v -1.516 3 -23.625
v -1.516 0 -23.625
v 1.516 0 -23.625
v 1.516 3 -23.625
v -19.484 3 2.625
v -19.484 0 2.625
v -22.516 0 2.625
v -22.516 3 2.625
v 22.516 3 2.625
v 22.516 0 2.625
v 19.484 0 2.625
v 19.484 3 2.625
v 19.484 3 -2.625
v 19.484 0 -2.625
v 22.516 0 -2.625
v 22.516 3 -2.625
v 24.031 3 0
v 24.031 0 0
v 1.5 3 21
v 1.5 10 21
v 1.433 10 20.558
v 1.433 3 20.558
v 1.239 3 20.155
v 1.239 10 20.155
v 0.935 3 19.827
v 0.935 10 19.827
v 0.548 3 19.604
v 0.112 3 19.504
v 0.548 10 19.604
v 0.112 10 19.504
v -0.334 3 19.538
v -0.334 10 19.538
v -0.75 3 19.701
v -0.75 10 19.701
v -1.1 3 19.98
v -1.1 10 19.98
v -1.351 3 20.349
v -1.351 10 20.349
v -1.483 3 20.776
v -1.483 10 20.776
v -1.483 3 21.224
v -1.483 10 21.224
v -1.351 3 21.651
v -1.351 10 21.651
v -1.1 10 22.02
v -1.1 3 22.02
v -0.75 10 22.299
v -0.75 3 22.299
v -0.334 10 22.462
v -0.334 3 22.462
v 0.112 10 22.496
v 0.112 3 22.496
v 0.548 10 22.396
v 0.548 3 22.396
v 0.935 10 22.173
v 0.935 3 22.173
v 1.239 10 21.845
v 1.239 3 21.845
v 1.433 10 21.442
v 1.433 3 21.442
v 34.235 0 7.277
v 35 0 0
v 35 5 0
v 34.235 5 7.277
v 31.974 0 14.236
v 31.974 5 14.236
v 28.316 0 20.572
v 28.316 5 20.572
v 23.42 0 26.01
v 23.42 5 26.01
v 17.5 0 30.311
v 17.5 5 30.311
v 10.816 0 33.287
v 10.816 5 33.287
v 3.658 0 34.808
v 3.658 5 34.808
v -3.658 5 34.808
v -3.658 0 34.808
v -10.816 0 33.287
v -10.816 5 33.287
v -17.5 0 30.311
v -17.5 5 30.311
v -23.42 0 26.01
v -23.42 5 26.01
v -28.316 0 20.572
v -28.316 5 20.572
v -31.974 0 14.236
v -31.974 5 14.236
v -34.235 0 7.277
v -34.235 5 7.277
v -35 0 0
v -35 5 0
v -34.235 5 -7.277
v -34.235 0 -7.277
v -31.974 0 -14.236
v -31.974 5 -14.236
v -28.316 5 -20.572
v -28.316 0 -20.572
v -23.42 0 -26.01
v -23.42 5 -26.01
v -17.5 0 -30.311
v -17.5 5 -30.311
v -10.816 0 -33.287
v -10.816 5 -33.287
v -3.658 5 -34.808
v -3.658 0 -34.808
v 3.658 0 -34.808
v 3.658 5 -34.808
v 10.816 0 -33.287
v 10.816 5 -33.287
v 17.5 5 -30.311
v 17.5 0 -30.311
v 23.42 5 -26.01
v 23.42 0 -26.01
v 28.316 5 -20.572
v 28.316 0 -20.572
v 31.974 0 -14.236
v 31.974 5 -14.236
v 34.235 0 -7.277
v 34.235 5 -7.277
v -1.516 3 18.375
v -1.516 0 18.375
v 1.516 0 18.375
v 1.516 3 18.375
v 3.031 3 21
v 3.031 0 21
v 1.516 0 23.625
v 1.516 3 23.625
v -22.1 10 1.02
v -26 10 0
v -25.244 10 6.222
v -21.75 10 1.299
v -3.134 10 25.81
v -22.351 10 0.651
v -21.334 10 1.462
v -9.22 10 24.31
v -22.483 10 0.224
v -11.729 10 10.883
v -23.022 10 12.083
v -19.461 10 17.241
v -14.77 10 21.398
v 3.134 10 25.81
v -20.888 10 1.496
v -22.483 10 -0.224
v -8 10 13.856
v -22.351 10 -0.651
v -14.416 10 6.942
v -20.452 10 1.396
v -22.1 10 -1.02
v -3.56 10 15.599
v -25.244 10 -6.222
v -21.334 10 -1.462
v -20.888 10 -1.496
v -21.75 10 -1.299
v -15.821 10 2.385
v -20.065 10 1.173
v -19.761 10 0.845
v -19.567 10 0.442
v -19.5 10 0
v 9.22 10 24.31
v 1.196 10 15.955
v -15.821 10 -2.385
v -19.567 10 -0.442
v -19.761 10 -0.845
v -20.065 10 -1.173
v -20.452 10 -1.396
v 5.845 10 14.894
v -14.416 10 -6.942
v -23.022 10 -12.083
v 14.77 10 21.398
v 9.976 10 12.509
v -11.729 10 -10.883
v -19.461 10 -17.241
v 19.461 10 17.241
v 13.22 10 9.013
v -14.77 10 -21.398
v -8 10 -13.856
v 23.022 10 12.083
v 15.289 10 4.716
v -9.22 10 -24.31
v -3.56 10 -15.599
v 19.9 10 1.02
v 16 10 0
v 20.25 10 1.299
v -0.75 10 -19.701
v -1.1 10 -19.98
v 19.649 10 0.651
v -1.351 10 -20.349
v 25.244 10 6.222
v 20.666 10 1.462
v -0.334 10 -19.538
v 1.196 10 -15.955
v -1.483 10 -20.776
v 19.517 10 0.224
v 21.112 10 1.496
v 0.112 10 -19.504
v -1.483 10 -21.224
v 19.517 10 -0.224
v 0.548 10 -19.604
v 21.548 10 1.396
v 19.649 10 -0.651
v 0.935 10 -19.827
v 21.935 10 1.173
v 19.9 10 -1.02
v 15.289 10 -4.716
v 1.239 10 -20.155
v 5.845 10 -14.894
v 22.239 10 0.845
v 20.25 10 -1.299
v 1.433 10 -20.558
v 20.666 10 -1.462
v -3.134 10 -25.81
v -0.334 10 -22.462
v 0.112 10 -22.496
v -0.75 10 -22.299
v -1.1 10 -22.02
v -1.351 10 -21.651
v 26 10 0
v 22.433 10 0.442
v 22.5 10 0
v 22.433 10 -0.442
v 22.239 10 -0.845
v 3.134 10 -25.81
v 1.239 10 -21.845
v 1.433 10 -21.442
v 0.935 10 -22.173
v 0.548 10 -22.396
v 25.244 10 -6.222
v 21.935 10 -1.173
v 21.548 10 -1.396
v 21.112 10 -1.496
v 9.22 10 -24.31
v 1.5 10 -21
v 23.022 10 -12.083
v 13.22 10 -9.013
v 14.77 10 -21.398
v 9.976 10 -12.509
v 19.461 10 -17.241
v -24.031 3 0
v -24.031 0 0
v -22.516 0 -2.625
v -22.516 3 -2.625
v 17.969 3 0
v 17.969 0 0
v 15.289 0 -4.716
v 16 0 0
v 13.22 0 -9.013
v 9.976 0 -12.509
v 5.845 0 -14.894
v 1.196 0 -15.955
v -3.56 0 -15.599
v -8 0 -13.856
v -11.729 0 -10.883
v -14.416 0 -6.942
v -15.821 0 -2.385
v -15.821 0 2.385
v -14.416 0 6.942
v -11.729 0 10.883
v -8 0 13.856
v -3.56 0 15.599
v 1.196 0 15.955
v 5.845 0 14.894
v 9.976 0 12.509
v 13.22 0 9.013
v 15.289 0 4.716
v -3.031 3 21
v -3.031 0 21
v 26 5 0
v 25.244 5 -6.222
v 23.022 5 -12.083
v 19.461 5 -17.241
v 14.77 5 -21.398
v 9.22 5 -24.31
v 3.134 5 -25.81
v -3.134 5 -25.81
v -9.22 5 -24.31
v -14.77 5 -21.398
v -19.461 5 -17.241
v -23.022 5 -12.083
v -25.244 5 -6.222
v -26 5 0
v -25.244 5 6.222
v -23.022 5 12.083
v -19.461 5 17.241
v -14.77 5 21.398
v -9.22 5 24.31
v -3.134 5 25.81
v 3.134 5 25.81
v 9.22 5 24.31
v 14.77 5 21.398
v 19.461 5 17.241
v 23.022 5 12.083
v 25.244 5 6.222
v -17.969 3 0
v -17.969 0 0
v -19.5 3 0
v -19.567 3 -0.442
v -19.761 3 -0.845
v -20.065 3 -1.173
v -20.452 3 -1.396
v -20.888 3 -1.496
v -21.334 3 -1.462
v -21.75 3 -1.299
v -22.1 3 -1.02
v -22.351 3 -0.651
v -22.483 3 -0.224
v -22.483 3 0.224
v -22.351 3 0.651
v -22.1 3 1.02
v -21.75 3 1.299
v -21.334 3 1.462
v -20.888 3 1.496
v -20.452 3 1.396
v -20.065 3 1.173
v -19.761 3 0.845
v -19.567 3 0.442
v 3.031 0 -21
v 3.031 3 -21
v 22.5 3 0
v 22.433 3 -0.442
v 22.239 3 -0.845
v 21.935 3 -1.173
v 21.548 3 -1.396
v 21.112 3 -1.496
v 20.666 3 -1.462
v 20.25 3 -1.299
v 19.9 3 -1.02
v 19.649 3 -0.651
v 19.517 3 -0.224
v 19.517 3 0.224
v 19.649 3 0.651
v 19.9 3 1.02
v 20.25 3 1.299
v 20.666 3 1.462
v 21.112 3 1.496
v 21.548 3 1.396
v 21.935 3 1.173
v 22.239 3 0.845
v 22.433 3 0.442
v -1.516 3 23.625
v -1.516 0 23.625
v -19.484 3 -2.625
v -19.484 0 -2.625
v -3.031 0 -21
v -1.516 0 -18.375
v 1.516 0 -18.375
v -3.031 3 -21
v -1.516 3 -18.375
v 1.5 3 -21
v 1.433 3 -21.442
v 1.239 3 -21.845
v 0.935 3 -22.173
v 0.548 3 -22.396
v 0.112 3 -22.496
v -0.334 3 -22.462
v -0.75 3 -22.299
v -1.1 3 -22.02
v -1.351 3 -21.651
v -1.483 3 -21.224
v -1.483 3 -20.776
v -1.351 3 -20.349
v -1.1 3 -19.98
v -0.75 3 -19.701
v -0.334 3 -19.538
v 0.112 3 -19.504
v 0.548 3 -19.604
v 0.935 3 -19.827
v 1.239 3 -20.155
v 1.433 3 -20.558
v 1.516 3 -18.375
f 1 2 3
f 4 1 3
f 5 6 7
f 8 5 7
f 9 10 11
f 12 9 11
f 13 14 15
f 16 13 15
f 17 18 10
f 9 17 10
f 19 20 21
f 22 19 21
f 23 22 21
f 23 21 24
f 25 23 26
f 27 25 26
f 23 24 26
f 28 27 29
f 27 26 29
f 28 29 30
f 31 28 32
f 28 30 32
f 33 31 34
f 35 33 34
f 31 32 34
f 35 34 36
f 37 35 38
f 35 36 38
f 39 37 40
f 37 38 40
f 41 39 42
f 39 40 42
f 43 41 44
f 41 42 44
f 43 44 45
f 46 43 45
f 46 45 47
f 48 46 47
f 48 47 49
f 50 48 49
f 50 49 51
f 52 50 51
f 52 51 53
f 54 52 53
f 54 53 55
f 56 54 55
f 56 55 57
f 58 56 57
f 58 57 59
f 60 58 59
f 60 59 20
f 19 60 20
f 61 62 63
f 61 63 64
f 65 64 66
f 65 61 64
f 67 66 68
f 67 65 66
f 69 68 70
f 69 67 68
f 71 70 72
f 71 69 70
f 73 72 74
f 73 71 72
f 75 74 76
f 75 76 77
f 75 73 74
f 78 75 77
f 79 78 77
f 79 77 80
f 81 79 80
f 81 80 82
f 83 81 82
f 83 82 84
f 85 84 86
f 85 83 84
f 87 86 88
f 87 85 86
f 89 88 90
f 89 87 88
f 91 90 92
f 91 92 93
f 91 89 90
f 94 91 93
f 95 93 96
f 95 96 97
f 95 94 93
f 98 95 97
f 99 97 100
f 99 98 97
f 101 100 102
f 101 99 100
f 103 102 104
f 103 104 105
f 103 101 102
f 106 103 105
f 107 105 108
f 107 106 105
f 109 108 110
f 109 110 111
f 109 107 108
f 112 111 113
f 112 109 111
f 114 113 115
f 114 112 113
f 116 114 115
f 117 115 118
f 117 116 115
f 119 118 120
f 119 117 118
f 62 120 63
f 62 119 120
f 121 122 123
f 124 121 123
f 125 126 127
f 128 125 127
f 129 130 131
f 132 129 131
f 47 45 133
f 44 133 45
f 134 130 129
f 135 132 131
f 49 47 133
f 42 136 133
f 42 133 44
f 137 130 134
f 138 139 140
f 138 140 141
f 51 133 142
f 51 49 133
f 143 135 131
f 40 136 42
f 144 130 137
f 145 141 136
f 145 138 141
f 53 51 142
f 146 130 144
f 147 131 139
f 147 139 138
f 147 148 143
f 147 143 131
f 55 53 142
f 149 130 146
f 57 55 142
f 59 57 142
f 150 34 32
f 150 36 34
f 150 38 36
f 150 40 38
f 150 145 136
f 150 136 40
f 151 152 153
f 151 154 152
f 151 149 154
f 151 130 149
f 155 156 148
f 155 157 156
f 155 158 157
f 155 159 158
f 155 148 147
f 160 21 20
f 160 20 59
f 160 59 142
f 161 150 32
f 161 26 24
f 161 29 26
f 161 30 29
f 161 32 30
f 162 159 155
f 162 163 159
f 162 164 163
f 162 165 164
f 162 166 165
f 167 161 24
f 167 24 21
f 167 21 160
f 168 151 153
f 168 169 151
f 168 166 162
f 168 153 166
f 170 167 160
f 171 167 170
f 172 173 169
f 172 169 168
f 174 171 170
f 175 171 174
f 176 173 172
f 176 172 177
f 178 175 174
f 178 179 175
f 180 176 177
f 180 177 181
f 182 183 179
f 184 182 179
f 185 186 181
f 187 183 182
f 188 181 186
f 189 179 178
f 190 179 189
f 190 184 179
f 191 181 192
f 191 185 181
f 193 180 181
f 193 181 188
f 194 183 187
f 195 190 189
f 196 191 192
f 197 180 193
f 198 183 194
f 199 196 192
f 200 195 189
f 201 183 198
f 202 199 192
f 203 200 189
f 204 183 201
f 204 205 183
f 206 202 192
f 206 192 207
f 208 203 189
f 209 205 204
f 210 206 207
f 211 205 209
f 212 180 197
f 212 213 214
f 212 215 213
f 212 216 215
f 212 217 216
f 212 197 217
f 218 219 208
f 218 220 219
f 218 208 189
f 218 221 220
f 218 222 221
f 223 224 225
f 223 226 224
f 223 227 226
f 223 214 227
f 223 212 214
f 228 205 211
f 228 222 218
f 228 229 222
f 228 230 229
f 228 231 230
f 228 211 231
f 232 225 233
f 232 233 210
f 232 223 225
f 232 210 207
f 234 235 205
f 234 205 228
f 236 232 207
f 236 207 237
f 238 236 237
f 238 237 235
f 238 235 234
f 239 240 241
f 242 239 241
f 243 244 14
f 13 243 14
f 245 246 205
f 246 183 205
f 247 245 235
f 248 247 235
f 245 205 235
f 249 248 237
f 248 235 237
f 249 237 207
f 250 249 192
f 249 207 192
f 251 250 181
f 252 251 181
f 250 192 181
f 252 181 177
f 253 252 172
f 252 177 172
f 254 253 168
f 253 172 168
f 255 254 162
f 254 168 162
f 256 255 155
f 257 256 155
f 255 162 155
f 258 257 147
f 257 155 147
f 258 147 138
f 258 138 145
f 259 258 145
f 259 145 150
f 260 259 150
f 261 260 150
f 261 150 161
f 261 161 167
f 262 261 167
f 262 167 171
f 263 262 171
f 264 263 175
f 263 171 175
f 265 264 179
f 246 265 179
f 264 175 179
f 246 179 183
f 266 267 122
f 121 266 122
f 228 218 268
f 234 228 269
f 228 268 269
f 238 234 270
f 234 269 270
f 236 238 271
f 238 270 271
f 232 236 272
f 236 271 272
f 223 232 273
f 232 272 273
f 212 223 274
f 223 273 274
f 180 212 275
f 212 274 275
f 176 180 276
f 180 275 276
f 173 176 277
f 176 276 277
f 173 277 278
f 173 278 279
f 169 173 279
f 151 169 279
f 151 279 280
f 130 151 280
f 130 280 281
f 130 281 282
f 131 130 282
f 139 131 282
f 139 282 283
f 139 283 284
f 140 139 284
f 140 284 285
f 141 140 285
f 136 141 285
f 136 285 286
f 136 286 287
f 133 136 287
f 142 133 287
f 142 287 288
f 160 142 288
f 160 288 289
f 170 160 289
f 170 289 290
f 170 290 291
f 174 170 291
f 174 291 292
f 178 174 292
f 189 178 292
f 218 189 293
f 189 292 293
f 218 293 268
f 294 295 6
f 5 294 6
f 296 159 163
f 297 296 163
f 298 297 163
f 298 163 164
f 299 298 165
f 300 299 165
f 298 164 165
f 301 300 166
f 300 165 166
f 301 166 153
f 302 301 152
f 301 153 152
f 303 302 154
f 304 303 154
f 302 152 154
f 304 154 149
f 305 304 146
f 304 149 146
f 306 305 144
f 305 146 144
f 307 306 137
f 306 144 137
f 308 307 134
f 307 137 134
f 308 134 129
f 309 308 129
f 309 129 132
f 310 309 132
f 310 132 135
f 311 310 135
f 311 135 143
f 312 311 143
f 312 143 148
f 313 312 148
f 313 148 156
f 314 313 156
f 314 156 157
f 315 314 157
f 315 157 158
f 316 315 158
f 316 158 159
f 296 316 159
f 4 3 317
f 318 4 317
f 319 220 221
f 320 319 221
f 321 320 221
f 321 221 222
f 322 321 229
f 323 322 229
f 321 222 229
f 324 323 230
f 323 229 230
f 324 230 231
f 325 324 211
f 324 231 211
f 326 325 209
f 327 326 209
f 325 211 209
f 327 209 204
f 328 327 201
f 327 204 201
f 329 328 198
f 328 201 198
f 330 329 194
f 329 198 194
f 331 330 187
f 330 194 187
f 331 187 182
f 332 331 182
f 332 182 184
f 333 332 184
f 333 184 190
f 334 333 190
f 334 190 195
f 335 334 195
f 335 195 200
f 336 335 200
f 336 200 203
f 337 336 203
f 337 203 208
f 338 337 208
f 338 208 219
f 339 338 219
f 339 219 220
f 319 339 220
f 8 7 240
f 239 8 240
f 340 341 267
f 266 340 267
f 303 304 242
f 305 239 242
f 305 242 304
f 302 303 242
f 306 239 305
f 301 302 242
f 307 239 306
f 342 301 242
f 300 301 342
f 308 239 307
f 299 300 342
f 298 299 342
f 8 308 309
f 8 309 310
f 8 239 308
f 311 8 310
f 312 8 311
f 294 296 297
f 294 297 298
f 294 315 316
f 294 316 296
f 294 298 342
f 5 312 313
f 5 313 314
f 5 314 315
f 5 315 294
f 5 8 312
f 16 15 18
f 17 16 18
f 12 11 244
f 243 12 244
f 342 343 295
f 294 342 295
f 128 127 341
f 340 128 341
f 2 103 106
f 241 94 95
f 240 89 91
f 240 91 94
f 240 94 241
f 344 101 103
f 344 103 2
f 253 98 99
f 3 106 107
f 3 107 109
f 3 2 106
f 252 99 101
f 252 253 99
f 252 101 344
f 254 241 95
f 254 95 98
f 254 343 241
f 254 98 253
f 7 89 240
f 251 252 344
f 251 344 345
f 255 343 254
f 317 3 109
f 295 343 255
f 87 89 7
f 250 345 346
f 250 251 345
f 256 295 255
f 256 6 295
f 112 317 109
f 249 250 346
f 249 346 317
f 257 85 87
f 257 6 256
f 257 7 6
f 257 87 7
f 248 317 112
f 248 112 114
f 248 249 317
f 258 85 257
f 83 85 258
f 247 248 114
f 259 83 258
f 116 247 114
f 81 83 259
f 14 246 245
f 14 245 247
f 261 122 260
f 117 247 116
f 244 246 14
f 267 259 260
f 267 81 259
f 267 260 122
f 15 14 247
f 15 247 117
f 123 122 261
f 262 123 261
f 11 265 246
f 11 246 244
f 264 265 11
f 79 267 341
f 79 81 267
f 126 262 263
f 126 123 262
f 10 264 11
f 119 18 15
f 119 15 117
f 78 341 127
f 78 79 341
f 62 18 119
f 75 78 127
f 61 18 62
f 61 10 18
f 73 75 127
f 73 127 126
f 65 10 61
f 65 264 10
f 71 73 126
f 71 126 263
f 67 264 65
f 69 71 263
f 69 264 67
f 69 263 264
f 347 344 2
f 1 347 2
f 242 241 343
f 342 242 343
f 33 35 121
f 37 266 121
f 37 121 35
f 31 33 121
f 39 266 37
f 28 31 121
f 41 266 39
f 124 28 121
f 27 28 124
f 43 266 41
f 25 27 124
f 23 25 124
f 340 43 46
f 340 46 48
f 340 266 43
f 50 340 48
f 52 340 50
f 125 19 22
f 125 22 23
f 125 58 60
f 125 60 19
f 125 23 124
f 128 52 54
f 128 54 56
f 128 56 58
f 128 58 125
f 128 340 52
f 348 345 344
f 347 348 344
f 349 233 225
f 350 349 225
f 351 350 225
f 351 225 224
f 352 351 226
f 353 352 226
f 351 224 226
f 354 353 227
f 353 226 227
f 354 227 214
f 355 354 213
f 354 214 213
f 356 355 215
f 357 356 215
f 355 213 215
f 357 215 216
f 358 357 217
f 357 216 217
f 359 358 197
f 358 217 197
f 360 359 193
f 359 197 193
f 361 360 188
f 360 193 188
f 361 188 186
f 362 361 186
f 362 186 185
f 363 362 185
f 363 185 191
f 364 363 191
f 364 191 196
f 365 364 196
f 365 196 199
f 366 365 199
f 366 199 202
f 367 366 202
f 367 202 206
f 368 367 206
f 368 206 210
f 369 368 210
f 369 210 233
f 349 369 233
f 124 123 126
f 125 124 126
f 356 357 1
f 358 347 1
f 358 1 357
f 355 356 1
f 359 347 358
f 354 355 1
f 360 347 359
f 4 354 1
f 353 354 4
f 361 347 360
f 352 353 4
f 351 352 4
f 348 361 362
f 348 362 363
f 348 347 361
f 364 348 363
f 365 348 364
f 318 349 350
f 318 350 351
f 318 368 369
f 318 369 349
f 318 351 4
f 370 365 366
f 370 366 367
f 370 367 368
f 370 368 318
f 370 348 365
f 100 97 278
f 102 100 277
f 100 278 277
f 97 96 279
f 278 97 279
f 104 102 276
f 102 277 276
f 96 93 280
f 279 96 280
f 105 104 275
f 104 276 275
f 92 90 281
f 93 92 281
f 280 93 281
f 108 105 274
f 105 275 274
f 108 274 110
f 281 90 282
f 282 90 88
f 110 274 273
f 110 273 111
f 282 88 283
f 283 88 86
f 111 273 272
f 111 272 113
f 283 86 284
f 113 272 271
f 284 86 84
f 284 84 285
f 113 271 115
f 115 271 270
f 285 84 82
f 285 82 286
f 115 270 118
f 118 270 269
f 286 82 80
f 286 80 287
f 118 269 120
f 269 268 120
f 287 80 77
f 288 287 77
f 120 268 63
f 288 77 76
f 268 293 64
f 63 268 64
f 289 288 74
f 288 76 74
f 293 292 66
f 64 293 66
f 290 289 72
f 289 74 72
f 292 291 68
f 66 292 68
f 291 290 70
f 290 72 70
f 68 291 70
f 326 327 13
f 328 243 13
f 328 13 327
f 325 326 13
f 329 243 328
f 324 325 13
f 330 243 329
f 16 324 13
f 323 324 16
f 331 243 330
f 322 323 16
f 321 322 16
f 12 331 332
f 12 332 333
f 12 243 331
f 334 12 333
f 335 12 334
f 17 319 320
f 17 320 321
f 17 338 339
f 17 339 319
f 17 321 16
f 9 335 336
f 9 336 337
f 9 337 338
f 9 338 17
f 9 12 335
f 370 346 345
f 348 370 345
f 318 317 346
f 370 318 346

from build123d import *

# Parameters (mm, degrees)
ESQUISSE1_R             = 26
ESQUISSE1_R_2           = 16
BOSS_EXTRU_1_DEPTH      = 10
ESQUISSE2_R             = 35
BOSS_EXTRU_2_DEPTH      = 5
ESQUISSE3_R             = 16
ENL_V_MAT_EXTRU_1_DEPTH = 5
ESQUISSE4_R             = 1.5
ENL_V_MAT_EXTRU_2_DEPTH = 35
ENL_V_MAT_EXTRU_3_DEPTH = 3


with BuildPart() as part:
    # Esquisse1 → Boss.-Extru.1 (new body)
    with BuildSketch(Plane(origin=(0, 0, 0), x_dir=(1, 0, 0), z_dir=(0, 1, 0))):
        Circle(ESQUISSE1_R)
        Circle(ESQUISSE1_R_2, mode=Mode.SUBTRACT)
    extrude(amount=BOSS_EXTRU_1_DEPTH)

    # Esquisse2 → Boss.-Extru.2 (add)
    with BuildSketch(Plane.XZ):
        Circle(ESQUISSE2_R)
    extrude(amount=-BOSS_EXTRU_2_DEPTH)

    # Esquisse3 → Enlèv. mat.-Extru.1 (cut)
    with BuildSketch(Plane(origin=(0, 5, 0), x_dir=(1, 0, 0), z_dir=(0, 1, 0))):
        Circle(ESQUISSE3_R)
    extrude(amount=-ENL_V_MAT_EXTRU_1_DEPTH, mode=Mode.SUBTRACT)

    # Esquisse4 → Enlèv. mat.-Extru.2 (cut)
    with BuildSketch(Plane(origin=(0, 10, 0), x_dir=(1, 0, 0), z_dir=(0, 1, 0))):
        with Locations((-21, 0)):
            Circle(ESQUISSE4_R)
        with Locations((21, 0)):
            Circle(ESQUISSE4_R)
        with Locations((0, -21)):
            Circle(ESQUISSE4_R)
        with Locations((0, 21)):
            Circle(ESQUISSE4_R)
    extrude(amount=-ENL_V_MAT_EXTRU_2_DEPTH, mode=Mode.SUBTRACT)

    # Esquisse5 → Enlèv. mat.-Extru.3 (cut)
    with BuildSketch(Plane.XZ):
        Polygon((24.031088913, 0), (22.515544457, 2.625), (19.484455543, 2.625), (17.968911087, 0), (19.484455543, -2.625), (22.515544457, -2.625), align=None)
        Polygon((3.031088913, -21), (1.515544457, -18.375), (-1.515544457, -18.375), (-3.031088913, -21), (-1.515544457, -23.625), (1.515544457, -23.625), align=None)
        Polygon((-17.968911087, 0), (-19.484455543, 2.625), (-22.515544457, 2.625), (-24.031088913, 0), (-22.515544457, -2.625), (-19.484455543, -2.625), align=None)
        Polygon((3.031088913, 21), (1.515544457, 23.625), (-1.515544457, 23.625), (-3.031088913, 21), (-1.515544457, 18.375), (1.515544457, 18.375), align=None)
    extrude(amount=-ENL_V_MAT_EXTRU_3_DEPTH, mode=Mode.SUBTRACT)


solid = part.part
